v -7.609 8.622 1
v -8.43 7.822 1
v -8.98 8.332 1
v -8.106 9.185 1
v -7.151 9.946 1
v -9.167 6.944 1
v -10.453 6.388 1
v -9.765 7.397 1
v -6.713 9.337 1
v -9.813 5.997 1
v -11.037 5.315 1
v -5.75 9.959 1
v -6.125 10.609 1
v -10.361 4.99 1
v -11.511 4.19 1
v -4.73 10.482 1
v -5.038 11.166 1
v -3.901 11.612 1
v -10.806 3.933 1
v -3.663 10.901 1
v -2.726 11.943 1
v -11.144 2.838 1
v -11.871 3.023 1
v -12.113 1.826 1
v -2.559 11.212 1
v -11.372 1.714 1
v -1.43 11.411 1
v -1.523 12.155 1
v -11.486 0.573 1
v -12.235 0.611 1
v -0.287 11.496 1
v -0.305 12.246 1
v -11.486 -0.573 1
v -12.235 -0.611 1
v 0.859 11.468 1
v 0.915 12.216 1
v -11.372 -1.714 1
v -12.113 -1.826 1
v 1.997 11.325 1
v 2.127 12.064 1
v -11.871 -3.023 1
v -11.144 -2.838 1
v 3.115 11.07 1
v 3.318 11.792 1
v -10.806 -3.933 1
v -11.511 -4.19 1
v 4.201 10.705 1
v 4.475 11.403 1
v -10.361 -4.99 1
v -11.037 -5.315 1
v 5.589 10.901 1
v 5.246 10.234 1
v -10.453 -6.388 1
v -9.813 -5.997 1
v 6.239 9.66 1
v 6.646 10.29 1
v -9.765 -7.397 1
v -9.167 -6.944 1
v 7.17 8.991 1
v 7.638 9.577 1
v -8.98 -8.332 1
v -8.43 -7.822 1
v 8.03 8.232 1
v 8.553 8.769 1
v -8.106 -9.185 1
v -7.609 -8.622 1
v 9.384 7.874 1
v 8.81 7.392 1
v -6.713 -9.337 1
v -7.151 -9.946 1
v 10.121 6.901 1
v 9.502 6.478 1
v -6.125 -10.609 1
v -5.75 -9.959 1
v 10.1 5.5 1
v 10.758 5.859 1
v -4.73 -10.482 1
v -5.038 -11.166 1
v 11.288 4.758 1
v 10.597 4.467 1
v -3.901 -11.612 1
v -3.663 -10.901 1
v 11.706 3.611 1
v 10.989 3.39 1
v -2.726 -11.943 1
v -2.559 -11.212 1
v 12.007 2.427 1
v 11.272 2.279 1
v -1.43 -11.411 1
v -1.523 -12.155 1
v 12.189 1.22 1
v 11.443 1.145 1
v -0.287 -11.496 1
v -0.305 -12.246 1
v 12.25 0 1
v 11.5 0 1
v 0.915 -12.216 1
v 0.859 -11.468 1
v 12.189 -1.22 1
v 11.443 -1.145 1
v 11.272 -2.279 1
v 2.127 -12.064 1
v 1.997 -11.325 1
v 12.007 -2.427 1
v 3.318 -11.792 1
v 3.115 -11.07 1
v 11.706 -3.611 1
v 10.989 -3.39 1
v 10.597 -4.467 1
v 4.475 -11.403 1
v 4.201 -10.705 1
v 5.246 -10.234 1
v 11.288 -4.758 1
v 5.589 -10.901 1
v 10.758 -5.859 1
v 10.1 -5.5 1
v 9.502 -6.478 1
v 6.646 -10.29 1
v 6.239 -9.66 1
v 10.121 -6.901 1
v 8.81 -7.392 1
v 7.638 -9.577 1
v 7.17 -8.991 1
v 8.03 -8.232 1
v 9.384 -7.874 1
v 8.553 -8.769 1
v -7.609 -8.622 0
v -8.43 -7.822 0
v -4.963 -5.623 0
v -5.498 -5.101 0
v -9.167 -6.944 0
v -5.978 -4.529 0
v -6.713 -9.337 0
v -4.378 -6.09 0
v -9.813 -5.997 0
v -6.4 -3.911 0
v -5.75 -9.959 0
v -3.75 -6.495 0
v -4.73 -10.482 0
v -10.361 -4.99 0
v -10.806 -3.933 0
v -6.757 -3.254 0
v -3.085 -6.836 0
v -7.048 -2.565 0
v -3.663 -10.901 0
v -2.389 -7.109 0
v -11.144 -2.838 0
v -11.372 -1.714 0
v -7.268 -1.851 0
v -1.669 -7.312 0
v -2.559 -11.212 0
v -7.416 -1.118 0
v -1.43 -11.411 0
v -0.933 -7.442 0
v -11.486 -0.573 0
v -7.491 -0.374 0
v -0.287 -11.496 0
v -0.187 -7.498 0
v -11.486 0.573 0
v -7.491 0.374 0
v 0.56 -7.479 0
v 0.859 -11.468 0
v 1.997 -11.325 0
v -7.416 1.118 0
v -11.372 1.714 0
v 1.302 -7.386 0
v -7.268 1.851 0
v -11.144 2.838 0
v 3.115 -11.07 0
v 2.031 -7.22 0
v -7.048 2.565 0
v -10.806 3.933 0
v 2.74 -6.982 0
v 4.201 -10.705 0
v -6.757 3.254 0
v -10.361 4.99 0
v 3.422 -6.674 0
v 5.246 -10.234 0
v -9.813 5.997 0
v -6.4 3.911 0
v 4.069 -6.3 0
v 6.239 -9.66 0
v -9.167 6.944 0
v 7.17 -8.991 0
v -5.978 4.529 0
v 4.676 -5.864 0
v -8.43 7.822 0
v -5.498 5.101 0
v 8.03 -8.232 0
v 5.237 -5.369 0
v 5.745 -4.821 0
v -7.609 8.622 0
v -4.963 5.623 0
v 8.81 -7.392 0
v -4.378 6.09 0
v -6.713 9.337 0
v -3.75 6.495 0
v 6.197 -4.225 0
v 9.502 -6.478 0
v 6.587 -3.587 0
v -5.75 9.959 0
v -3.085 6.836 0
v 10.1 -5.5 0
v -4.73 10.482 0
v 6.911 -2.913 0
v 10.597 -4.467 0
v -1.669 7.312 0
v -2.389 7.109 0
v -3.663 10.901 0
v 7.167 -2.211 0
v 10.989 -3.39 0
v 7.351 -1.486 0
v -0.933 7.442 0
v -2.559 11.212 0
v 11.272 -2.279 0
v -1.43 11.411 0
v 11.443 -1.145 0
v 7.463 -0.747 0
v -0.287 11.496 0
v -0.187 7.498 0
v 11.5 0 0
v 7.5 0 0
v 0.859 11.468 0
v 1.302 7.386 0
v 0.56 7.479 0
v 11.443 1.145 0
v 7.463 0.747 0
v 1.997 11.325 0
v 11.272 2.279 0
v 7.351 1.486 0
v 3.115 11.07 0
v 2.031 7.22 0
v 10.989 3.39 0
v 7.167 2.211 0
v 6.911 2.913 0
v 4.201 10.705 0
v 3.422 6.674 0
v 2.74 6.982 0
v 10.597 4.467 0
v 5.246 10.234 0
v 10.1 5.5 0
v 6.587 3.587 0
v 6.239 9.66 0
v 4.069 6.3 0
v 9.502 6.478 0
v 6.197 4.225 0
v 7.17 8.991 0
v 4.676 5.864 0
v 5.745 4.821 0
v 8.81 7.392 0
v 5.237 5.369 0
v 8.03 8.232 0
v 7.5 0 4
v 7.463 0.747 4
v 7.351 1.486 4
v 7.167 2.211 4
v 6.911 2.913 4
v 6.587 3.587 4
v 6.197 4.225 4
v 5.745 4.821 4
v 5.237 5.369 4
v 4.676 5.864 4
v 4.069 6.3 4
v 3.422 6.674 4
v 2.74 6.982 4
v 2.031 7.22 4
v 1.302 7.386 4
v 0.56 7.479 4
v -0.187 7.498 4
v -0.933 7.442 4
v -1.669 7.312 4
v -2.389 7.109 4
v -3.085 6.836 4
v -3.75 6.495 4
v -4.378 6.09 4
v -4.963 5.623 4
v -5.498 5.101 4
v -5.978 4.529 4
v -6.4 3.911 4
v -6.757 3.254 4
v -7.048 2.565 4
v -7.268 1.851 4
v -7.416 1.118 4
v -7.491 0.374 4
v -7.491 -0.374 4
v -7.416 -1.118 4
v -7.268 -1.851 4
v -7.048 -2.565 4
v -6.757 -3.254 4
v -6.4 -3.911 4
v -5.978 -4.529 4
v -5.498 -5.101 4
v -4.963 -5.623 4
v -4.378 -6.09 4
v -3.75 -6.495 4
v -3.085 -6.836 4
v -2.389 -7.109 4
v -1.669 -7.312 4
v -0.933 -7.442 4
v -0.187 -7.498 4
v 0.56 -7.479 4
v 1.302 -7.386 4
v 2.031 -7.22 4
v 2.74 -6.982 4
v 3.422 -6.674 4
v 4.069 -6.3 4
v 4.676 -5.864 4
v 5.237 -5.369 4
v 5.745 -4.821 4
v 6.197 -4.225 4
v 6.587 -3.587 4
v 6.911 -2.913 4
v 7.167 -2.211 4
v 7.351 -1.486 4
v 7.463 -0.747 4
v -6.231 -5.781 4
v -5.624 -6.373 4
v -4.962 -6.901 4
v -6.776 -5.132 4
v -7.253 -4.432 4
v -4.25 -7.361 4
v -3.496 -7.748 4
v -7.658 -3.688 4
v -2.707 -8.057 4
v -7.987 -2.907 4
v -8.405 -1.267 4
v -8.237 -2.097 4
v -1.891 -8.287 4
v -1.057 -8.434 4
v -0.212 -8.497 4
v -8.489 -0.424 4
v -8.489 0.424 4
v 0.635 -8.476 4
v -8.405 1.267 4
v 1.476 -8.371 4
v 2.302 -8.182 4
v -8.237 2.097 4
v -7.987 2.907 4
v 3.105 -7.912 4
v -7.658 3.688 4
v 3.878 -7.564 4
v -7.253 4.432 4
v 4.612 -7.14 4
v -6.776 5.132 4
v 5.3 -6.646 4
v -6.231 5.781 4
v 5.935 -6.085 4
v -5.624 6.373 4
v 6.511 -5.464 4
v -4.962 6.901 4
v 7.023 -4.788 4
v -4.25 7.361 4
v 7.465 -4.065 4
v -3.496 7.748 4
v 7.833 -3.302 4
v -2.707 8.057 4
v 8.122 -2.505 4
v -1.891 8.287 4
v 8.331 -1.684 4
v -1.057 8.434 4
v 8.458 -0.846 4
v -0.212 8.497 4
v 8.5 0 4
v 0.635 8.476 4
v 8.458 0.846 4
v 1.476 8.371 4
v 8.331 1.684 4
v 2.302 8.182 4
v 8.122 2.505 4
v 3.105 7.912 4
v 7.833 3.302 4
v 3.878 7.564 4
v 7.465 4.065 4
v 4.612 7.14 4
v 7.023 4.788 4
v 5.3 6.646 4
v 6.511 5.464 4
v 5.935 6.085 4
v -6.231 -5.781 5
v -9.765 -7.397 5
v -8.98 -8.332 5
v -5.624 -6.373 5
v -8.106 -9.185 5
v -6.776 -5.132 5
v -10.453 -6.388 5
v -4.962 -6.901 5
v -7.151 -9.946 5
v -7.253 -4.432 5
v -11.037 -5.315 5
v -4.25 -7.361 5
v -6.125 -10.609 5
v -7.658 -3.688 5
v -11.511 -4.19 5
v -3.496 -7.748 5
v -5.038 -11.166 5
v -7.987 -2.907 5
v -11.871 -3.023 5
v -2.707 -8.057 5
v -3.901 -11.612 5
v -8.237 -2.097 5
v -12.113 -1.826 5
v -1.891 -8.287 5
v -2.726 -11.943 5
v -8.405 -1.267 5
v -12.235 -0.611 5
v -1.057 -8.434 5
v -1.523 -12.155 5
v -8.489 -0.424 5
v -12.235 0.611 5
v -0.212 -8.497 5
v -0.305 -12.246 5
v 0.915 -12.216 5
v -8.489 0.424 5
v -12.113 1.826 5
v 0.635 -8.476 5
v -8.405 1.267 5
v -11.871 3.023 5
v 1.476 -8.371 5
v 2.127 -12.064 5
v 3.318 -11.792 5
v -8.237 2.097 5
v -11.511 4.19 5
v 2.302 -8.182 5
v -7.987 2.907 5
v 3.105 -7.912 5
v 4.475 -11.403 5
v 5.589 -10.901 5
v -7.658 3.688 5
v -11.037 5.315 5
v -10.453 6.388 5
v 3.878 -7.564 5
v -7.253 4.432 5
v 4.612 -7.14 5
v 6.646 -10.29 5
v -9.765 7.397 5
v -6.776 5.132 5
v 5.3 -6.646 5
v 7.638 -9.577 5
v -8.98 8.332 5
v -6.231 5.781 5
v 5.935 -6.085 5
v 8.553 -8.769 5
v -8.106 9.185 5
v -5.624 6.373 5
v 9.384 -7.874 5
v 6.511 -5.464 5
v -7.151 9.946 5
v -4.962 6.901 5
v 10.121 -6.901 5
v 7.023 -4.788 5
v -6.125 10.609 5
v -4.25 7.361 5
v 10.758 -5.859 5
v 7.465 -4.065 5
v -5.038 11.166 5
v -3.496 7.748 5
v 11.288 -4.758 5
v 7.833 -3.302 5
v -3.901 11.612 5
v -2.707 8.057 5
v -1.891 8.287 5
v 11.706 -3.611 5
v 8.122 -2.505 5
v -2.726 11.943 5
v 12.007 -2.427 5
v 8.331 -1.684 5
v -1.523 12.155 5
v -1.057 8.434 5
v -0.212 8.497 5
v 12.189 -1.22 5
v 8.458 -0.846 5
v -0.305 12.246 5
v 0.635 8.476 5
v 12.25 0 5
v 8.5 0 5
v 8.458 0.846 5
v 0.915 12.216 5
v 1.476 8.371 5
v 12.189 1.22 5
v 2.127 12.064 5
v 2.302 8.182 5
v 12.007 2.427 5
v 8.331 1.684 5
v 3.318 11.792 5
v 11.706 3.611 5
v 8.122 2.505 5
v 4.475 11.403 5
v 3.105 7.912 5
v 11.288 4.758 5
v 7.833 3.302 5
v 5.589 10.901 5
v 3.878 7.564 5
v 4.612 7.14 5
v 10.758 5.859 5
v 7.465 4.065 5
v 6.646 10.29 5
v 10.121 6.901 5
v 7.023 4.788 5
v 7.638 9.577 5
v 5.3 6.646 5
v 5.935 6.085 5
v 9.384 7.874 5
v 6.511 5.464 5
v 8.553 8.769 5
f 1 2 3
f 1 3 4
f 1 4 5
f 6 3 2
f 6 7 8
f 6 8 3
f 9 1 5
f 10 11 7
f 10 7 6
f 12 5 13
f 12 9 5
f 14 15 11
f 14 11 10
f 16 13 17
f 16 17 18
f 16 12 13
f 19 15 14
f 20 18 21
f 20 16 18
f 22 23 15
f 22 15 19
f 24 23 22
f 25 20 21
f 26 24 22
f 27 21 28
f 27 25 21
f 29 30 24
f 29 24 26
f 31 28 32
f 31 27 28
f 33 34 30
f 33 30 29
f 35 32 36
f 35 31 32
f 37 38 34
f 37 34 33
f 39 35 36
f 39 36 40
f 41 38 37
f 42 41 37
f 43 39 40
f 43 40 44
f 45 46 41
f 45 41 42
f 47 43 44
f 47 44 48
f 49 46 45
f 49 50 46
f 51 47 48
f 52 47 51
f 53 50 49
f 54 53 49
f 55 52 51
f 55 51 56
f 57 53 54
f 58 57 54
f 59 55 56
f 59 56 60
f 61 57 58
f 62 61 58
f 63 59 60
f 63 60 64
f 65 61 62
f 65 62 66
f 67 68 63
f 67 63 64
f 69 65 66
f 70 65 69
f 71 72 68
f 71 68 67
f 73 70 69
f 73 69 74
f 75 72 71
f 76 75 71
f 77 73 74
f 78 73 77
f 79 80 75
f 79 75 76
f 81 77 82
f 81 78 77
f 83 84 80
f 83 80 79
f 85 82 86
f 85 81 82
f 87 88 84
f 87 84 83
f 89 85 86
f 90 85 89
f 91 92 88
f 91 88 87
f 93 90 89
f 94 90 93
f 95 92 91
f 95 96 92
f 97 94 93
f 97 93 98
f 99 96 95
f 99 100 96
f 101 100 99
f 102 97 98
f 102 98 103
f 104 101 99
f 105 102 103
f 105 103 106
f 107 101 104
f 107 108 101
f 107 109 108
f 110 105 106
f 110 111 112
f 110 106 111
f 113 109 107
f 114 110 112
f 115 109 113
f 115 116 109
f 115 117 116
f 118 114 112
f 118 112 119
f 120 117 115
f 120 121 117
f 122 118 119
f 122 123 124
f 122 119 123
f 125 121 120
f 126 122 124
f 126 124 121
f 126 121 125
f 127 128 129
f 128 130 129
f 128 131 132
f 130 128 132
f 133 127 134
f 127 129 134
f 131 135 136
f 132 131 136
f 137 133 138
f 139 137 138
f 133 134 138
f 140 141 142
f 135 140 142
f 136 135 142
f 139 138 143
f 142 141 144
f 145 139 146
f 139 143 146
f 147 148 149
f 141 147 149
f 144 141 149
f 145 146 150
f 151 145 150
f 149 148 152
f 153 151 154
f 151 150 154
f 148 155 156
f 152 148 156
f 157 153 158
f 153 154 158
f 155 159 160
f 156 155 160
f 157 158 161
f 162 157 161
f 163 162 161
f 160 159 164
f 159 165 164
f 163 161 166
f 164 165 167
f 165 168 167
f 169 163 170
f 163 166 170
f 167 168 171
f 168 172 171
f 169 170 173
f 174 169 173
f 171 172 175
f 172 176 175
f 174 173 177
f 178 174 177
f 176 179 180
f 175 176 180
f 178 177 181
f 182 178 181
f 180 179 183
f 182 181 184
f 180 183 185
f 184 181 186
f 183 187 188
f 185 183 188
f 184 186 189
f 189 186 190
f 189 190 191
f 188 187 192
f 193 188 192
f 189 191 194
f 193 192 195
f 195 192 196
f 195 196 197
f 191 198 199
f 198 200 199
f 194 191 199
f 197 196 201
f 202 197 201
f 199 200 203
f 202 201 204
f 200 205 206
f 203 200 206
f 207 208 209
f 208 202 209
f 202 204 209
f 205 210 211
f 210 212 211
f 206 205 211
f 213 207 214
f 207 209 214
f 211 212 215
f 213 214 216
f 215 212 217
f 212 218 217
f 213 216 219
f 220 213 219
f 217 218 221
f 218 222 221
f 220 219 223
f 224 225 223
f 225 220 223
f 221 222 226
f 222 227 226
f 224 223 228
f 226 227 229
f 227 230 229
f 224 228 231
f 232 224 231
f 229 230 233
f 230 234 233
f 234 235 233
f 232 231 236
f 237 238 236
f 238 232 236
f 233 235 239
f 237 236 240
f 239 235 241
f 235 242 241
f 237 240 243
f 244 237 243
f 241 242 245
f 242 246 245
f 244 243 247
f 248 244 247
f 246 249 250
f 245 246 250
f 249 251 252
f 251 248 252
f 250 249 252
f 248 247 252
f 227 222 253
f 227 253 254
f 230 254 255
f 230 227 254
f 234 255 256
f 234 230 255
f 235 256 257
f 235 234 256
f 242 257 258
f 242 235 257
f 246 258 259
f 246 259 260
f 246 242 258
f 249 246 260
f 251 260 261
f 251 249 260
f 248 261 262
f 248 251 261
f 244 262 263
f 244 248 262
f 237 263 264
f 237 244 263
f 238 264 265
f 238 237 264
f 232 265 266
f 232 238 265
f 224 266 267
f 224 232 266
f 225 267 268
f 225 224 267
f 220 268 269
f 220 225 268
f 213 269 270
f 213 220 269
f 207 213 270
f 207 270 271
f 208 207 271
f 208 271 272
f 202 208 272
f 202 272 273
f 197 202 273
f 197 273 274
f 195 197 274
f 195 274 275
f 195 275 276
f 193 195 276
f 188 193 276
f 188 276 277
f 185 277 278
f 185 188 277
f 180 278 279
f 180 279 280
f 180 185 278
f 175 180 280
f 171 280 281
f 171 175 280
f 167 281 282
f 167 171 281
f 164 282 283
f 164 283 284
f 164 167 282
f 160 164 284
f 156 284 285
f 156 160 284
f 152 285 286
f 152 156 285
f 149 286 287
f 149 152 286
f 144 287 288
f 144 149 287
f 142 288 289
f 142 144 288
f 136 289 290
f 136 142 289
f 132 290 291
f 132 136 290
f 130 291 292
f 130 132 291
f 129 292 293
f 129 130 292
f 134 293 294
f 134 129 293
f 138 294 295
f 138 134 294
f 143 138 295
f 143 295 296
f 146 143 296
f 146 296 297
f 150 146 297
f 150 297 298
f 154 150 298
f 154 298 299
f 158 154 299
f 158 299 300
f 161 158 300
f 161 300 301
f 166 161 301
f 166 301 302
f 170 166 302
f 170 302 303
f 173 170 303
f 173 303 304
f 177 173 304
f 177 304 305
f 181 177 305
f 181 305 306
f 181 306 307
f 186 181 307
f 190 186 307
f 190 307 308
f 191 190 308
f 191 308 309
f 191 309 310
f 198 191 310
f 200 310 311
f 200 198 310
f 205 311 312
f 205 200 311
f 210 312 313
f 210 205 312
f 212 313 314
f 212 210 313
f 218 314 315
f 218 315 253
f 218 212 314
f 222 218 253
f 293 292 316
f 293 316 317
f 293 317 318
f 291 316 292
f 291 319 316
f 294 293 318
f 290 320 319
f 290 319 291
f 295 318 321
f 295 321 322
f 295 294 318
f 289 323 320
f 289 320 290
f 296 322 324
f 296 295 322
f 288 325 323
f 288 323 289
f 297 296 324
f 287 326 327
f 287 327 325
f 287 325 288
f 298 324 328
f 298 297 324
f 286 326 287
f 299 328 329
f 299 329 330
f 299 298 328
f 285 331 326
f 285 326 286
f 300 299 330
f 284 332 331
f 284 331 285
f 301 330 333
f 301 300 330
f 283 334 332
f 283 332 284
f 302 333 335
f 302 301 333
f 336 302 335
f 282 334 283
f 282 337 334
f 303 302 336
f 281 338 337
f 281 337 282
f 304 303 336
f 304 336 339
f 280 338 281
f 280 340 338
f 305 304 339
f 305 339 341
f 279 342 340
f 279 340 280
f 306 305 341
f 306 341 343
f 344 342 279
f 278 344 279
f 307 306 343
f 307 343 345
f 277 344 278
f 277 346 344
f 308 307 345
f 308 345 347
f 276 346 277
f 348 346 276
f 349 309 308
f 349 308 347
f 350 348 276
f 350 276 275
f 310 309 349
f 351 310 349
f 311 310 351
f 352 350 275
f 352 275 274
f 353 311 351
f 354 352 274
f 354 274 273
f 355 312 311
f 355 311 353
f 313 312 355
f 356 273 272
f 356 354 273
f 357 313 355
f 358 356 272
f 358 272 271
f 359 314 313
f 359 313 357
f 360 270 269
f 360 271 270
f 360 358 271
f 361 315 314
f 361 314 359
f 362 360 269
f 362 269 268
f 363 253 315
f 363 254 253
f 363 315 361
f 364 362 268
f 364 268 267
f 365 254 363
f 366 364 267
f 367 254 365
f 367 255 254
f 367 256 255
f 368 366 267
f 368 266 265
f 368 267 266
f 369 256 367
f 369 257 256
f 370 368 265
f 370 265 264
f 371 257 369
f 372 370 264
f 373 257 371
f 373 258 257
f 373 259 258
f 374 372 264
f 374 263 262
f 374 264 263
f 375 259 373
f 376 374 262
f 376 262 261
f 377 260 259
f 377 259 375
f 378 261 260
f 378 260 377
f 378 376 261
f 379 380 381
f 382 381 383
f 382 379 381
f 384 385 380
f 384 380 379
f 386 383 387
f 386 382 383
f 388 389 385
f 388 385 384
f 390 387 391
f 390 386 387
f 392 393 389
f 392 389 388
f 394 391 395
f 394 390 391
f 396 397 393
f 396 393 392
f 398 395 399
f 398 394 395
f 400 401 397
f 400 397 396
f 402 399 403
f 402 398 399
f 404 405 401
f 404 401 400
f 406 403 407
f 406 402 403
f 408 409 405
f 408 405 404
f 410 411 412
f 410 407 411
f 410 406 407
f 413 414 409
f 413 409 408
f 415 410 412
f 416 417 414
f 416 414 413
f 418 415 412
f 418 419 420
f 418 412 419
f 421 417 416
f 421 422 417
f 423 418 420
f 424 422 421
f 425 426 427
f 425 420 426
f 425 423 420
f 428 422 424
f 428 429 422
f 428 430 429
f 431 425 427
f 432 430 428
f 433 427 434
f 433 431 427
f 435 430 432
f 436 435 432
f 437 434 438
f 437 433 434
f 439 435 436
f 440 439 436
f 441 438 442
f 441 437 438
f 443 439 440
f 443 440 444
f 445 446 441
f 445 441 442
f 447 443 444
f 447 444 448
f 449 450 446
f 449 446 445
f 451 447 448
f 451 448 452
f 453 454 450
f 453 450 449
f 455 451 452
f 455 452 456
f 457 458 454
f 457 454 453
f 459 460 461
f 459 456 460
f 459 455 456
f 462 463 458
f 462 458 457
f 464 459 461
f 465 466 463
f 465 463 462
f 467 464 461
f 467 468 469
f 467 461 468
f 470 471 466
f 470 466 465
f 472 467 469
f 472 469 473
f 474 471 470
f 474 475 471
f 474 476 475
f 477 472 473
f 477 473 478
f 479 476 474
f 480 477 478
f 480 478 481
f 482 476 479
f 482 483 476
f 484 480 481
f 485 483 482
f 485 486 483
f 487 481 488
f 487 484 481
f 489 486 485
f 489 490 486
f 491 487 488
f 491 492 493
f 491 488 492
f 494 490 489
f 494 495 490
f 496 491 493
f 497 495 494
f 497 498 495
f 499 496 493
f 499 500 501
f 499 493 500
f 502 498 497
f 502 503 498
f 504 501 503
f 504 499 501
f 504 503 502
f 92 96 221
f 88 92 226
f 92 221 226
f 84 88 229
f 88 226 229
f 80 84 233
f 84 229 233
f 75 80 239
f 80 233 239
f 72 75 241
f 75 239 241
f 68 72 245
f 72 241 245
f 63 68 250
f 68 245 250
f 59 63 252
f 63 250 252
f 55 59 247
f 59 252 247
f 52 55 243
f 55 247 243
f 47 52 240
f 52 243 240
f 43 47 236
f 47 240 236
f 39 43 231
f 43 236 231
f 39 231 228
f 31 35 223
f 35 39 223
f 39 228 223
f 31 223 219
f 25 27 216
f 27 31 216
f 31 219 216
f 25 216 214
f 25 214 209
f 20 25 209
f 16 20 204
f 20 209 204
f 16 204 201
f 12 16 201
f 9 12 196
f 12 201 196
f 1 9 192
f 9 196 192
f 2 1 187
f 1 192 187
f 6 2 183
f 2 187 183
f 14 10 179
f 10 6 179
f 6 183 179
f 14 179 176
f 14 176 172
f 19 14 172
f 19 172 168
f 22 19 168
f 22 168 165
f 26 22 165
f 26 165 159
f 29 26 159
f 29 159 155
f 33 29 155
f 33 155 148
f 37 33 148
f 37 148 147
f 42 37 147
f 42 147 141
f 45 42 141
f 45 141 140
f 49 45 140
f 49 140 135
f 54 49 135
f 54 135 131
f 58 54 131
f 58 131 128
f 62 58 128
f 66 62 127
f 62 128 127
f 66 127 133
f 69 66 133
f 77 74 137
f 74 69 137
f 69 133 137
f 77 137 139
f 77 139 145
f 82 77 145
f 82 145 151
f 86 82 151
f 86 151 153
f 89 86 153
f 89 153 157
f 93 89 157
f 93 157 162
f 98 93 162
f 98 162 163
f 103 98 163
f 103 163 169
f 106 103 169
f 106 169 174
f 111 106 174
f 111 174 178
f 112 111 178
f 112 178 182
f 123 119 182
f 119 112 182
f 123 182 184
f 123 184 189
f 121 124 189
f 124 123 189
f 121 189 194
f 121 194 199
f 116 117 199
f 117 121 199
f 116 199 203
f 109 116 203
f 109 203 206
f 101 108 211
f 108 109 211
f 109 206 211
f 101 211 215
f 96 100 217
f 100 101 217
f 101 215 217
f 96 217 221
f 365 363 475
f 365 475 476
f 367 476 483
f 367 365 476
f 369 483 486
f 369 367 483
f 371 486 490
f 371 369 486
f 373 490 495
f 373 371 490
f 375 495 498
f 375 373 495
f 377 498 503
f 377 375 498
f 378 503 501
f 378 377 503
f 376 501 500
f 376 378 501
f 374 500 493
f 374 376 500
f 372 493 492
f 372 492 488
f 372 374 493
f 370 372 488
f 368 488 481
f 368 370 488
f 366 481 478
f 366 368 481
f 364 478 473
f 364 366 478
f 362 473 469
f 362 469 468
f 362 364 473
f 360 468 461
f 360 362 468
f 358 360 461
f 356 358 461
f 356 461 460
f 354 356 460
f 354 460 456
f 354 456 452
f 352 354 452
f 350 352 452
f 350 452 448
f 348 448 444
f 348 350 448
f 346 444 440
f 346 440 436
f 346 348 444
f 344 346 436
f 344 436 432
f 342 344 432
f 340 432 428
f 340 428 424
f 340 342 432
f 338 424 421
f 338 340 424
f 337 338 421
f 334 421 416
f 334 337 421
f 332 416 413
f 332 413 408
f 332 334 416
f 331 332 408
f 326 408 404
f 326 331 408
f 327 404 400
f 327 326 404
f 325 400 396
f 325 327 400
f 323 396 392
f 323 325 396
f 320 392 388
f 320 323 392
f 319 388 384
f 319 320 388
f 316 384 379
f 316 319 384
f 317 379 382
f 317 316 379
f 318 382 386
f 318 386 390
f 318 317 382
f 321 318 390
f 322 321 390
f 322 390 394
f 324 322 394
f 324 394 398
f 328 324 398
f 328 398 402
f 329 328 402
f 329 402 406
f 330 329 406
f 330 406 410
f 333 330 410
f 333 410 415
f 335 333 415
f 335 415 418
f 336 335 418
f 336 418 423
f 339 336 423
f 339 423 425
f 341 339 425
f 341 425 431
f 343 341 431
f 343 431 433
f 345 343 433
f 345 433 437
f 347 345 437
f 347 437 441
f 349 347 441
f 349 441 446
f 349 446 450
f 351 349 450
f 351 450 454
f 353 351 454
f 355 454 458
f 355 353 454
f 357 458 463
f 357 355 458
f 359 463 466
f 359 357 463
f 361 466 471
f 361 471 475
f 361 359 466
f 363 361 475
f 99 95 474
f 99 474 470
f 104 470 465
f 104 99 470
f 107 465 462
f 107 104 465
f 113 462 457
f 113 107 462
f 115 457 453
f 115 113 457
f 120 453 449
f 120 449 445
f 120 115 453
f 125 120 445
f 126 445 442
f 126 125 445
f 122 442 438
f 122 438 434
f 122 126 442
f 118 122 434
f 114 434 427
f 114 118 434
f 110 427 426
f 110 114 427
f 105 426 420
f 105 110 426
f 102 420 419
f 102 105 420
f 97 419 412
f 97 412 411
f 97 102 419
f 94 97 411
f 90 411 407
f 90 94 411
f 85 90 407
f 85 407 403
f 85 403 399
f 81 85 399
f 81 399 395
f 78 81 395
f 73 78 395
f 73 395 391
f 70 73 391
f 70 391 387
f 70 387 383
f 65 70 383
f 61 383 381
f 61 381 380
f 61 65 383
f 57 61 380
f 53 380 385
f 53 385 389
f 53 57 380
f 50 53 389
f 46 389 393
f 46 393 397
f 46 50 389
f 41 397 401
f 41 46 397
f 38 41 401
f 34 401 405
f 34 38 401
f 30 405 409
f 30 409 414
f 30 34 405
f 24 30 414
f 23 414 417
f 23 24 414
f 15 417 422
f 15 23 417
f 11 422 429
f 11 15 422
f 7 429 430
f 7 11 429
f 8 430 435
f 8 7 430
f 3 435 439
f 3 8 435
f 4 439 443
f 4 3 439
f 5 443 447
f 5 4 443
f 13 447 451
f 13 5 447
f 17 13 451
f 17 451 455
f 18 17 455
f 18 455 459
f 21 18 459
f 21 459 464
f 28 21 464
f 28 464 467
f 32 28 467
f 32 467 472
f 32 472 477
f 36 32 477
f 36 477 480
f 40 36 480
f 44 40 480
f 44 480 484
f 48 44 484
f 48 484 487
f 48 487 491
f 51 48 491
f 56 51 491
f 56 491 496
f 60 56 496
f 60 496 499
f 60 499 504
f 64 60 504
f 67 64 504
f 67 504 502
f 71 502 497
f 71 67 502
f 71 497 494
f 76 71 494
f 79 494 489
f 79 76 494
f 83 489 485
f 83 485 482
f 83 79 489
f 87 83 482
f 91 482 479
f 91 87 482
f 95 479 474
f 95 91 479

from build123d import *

# Parameters (mm, degrees)
SKETCH_R      = 11.5
SKETCH_R_2    = 7.5
PAD_DEPTH     = 4
SKETCH001_R   = 12.25
SKETCH001_R_2 = 11.5
PAD001_DEPTH  = 4
SKETCH002_R   = 11.5
SKETCH002_R_2 = 8.5
PAD002_DEPTH  = 1


with BuildPart() as part:
    # Sketch → Pad (new body)
    with BuildSketch(Plane.XY):
        Circle(SKETCH_R)
        Circle(SKETCH_R_2, mode=Mode.SUBTRACT)
    extrude(amount=PAD_DEPTH)

    # Sketch001 (on Face3 of Pad) → Pad001 (join)
    with BuildSketch(Plane(origin=(0, 0, 1), x_dir=(1, 0, 0), z_dir=(0, 0, -1))):
        Circle(SKETCH001_R)
        Circle(SKETCH001_R_2, mode=Mode.SUBTRACT)
    extrude(amount=-PAD001_DEPTH)

    # Sketch002 (on Face6 of Pad001) → Pad002 (join)
    with BuildSketch(Plane.XY.offset(4)):
        Circle(SKETCH002_R)
        Circle(SKETCH002_R_2, mode=Mode.SUBTRACT)
    extrude(amount=PAD002_DEPTH)


solid = part.part
